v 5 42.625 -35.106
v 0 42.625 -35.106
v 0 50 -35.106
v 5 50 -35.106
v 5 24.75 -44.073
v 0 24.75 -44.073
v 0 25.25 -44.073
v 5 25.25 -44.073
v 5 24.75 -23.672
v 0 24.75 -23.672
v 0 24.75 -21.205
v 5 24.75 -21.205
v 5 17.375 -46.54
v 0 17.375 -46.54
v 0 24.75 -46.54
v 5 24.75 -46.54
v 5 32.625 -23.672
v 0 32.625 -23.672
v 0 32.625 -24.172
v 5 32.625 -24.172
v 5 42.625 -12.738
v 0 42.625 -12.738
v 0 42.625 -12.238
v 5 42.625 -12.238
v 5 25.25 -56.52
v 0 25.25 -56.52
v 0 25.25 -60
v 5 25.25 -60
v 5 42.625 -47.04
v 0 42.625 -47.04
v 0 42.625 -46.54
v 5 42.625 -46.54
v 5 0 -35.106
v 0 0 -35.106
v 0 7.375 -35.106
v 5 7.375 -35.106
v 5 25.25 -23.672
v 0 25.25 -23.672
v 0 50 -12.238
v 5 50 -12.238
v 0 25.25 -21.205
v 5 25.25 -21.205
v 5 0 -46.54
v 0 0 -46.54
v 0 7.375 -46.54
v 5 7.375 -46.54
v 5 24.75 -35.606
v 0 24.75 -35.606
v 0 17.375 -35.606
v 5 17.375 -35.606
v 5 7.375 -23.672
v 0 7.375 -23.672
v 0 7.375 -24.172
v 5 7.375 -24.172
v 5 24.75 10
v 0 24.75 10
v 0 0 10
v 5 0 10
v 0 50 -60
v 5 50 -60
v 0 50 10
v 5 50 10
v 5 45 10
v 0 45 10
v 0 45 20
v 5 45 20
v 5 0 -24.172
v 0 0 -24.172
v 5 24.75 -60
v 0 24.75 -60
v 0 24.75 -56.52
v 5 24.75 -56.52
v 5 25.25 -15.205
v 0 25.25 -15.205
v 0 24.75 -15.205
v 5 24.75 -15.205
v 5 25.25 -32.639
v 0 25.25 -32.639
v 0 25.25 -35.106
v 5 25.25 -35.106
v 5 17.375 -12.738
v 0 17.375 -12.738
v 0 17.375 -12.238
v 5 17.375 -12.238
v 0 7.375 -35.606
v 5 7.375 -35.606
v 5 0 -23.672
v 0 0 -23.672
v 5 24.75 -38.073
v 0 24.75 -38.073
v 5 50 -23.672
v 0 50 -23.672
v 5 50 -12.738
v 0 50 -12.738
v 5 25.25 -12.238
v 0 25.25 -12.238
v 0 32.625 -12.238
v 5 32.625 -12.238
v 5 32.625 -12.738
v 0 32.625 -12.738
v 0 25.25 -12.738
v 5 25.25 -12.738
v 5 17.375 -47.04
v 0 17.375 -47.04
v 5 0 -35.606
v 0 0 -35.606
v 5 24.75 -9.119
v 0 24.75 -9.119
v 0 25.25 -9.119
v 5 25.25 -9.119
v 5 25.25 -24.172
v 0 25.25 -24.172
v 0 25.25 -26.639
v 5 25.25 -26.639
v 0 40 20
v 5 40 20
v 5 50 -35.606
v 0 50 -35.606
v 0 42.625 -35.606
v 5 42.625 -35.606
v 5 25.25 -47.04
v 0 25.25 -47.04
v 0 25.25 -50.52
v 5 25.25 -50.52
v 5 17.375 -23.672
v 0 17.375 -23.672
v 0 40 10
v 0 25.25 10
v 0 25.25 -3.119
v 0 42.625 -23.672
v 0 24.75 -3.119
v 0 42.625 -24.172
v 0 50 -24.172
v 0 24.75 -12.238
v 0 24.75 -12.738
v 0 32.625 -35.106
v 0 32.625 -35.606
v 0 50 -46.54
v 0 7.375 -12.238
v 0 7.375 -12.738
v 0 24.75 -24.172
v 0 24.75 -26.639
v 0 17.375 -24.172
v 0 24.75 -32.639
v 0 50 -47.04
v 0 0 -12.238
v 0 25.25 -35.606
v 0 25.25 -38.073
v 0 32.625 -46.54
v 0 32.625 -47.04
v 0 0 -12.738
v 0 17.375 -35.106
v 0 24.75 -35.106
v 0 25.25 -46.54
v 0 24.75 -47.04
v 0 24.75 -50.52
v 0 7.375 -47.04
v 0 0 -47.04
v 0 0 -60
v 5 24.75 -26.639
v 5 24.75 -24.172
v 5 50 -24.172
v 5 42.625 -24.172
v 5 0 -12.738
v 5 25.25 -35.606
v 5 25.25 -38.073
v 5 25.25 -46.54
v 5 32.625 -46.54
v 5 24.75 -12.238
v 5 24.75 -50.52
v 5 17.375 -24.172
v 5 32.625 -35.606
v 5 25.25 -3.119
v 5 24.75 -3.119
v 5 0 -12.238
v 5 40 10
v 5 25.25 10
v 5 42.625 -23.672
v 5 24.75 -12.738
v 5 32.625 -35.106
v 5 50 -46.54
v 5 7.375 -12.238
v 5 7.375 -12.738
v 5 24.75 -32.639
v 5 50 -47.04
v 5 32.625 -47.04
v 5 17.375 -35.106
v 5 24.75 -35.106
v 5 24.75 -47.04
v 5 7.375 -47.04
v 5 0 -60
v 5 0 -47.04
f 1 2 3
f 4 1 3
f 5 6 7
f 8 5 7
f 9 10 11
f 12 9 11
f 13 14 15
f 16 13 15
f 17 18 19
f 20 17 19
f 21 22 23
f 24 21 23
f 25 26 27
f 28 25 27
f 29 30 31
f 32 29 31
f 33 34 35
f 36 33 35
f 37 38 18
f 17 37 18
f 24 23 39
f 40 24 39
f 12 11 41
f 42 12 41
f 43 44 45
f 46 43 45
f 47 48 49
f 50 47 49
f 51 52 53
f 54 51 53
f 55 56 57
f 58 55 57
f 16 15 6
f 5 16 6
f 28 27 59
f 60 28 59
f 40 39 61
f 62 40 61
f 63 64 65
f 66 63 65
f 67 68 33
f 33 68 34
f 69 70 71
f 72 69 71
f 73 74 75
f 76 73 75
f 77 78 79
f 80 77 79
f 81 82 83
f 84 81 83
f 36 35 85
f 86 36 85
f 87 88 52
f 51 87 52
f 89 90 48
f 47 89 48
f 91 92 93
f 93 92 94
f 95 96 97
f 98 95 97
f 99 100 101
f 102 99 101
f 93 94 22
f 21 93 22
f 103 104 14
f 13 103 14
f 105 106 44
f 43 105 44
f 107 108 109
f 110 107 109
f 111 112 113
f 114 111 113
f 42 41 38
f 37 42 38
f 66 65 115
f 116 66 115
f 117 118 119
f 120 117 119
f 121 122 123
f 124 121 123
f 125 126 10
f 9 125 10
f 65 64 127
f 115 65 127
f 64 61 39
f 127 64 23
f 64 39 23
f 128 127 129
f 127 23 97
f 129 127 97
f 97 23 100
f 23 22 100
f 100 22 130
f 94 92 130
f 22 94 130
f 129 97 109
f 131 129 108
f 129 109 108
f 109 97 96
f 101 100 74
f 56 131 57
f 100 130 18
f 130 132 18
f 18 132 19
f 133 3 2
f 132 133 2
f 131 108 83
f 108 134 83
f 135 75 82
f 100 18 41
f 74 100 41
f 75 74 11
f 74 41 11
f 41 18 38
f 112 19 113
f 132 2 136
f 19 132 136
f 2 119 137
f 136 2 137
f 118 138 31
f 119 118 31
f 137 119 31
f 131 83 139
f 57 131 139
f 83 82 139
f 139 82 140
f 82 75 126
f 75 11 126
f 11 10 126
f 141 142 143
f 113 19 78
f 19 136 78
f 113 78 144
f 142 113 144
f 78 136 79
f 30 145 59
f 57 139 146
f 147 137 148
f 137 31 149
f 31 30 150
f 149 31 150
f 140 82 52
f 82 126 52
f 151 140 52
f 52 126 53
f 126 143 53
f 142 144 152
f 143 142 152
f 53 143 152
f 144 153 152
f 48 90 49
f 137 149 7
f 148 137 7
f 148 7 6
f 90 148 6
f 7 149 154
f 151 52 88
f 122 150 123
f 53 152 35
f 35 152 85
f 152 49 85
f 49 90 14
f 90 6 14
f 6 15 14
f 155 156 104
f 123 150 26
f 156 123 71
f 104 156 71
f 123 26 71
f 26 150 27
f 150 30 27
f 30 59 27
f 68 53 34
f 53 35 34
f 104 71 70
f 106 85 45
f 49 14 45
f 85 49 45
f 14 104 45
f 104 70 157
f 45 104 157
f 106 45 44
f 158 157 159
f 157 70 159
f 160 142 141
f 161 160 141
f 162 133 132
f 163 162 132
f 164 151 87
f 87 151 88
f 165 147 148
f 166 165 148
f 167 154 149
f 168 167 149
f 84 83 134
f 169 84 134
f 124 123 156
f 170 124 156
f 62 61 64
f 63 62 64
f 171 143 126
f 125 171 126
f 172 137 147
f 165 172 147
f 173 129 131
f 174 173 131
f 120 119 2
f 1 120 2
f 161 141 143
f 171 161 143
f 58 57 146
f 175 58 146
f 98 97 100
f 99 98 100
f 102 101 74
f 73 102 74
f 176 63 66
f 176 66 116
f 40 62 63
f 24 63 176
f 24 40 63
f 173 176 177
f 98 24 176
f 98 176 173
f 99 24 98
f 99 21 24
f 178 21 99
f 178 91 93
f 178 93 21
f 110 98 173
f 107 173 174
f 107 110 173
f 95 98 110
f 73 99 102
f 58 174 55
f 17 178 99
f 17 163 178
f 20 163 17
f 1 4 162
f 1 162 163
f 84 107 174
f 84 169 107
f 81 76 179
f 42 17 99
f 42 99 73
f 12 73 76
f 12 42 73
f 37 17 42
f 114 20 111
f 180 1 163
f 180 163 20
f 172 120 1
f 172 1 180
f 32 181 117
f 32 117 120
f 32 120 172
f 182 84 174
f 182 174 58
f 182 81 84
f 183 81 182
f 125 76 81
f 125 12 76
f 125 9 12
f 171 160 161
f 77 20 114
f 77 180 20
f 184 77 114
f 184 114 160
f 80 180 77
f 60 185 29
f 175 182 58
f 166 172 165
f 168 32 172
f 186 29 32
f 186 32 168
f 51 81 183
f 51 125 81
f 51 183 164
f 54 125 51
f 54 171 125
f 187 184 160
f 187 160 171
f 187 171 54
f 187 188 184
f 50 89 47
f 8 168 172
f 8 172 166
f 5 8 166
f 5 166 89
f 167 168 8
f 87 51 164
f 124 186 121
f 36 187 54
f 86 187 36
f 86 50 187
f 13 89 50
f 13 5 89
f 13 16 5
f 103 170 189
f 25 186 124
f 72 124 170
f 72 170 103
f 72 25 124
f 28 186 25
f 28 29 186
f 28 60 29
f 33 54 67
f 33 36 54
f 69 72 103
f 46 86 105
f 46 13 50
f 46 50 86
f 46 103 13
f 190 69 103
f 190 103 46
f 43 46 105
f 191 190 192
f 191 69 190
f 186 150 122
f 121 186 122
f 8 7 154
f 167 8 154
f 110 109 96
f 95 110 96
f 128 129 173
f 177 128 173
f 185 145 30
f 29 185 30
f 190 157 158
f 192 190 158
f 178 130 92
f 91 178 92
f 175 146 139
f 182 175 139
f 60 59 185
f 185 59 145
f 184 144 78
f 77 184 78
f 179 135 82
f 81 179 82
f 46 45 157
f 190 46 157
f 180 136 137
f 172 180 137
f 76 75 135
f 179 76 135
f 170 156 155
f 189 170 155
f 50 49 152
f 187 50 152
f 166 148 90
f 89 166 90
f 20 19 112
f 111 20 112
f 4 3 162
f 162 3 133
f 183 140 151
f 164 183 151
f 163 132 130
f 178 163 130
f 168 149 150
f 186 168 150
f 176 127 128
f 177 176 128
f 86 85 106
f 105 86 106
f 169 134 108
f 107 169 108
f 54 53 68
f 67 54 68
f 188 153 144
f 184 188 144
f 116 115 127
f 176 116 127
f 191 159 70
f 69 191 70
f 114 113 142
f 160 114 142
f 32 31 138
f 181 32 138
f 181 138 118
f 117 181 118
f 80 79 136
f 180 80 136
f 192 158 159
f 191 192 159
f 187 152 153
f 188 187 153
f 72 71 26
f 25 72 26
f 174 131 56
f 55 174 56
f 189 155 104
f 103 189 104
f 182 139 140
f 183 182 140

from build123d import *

# Parameters (mm, degrees)
F1_DEPTH = 5
F2_DEPTH = 10


# Not quite as in the source:
# - a feature names something its author has since deleted; it is built from what else it names


with BuildPart() as f1:
    # F0 (on Right) → F1 (new body)
    with BuildSketch(Plane.YZ):
        Polygon((11.5, 0), (0, 0), (0, -12.238), (7.3750000447, -12.238), (7.3750000447, -12.738), (0, -12.738), (0, -23.672), (7.3750000447, -23.672), (7.3750000447, -24.172), (0, -24.172), (0, -35.106), (7.3750000447, -35.106), (7.3750000447, -35.606), (0, -35.606), (0, -46.54), (7.3750000447, -46.54), (7.3750000447, -47.04), (0, -47.04), (0, -60), (24.75, -60), (24.75, -56.52), (25.25, -56.52), (25.25, -60), (50, -60), (50, -47.04), (42.6249988377, -47.04), (42.6249988377, -46.54), (50, -46.54), (50, -35.606), (42.6249988377, -35.606), (42.6249988377, -35.106), (50, -35.106), (50, -24.172), (42.6249988377, -24.172), (42.6249988377, -23.672), (50, -23.672), (50, -12.738), (42.6249988377, -12.738), (42.6249988377, -12.238), (50, -12.238), (50, 0), (45, 0), (45, 15), (45, 19.999999553), (40, 19.999999553), (40, 15), (40, 0), (37.625, 0), (35.125, 0), (25.25, 0), (25.25, -1.304), (25.25, -3.119), (24.75, -3.119), (24.75, 0), (14.875, 0), (12.375, 0), align=None)
        Polygon((25.25, -44.073), (25.25, -46.54), (32.625, -46.54), (32.625, -47.04), (25.25, -47.04), (25.25, -50.52), (24.75, -50.52), (24.75, -47.04), (17.375, -47.04), (17.375, -46.54), (24.75, -46.54), (24.75, -44.073), align=None, mode=Mode.SUBTRACT)
        Polygon((25.25, -32.639), (25.25, -35.106), (32.625, -35.106), (32.625, -35.606), (25.25, -35.606), (25.25, -38.073), (24.75, -38.073), (24.75, -35.606), (17.375, -35.606), (17.375, -35.106), (24.75, -35.106), (24.75, -32.639), align=None, mode=Mode.SUBTRACT)
        Polygon((25.25, -21.205), (25.25, -23.672), (32.625, -23.672), (32.625, -24.172), (25.25, -24.172), (25.25, -26.639), (24.75, -26.639), (24.75, -24.172), (17.375, -24.172), (17.375, -23.672), (24.75, -23.672), (24.75, -21.205), align=None, mode=Mode.SUBTRACT)
        Polygon((25.25, -9.119), (25.25, -12.238), (32.625, -12.238), (32.625, -12.738), (25.25, -12.738), (25.25, -15.205), (24.75, -15.205), (24.75, -12.738), (17.375, -12.738), (17.375, -12.238), (24.75, -12.238), (24.75, -9.119), align=None, mode=Mode.SUBTRACT)
    extrude(amount=F1_DEPTH)

    # F2 (add): faces of the model
    f2_faces = [f1.faces().sort_by_distance(p)[0] for p in [
        (2.5, 32.625, 0),
        (2.5, 12.375, 0),
        (2.5, 47.5, 0),
    ]]
    extrude(f2_faces, amount=F2_DEPTH)


solid = f1.part
